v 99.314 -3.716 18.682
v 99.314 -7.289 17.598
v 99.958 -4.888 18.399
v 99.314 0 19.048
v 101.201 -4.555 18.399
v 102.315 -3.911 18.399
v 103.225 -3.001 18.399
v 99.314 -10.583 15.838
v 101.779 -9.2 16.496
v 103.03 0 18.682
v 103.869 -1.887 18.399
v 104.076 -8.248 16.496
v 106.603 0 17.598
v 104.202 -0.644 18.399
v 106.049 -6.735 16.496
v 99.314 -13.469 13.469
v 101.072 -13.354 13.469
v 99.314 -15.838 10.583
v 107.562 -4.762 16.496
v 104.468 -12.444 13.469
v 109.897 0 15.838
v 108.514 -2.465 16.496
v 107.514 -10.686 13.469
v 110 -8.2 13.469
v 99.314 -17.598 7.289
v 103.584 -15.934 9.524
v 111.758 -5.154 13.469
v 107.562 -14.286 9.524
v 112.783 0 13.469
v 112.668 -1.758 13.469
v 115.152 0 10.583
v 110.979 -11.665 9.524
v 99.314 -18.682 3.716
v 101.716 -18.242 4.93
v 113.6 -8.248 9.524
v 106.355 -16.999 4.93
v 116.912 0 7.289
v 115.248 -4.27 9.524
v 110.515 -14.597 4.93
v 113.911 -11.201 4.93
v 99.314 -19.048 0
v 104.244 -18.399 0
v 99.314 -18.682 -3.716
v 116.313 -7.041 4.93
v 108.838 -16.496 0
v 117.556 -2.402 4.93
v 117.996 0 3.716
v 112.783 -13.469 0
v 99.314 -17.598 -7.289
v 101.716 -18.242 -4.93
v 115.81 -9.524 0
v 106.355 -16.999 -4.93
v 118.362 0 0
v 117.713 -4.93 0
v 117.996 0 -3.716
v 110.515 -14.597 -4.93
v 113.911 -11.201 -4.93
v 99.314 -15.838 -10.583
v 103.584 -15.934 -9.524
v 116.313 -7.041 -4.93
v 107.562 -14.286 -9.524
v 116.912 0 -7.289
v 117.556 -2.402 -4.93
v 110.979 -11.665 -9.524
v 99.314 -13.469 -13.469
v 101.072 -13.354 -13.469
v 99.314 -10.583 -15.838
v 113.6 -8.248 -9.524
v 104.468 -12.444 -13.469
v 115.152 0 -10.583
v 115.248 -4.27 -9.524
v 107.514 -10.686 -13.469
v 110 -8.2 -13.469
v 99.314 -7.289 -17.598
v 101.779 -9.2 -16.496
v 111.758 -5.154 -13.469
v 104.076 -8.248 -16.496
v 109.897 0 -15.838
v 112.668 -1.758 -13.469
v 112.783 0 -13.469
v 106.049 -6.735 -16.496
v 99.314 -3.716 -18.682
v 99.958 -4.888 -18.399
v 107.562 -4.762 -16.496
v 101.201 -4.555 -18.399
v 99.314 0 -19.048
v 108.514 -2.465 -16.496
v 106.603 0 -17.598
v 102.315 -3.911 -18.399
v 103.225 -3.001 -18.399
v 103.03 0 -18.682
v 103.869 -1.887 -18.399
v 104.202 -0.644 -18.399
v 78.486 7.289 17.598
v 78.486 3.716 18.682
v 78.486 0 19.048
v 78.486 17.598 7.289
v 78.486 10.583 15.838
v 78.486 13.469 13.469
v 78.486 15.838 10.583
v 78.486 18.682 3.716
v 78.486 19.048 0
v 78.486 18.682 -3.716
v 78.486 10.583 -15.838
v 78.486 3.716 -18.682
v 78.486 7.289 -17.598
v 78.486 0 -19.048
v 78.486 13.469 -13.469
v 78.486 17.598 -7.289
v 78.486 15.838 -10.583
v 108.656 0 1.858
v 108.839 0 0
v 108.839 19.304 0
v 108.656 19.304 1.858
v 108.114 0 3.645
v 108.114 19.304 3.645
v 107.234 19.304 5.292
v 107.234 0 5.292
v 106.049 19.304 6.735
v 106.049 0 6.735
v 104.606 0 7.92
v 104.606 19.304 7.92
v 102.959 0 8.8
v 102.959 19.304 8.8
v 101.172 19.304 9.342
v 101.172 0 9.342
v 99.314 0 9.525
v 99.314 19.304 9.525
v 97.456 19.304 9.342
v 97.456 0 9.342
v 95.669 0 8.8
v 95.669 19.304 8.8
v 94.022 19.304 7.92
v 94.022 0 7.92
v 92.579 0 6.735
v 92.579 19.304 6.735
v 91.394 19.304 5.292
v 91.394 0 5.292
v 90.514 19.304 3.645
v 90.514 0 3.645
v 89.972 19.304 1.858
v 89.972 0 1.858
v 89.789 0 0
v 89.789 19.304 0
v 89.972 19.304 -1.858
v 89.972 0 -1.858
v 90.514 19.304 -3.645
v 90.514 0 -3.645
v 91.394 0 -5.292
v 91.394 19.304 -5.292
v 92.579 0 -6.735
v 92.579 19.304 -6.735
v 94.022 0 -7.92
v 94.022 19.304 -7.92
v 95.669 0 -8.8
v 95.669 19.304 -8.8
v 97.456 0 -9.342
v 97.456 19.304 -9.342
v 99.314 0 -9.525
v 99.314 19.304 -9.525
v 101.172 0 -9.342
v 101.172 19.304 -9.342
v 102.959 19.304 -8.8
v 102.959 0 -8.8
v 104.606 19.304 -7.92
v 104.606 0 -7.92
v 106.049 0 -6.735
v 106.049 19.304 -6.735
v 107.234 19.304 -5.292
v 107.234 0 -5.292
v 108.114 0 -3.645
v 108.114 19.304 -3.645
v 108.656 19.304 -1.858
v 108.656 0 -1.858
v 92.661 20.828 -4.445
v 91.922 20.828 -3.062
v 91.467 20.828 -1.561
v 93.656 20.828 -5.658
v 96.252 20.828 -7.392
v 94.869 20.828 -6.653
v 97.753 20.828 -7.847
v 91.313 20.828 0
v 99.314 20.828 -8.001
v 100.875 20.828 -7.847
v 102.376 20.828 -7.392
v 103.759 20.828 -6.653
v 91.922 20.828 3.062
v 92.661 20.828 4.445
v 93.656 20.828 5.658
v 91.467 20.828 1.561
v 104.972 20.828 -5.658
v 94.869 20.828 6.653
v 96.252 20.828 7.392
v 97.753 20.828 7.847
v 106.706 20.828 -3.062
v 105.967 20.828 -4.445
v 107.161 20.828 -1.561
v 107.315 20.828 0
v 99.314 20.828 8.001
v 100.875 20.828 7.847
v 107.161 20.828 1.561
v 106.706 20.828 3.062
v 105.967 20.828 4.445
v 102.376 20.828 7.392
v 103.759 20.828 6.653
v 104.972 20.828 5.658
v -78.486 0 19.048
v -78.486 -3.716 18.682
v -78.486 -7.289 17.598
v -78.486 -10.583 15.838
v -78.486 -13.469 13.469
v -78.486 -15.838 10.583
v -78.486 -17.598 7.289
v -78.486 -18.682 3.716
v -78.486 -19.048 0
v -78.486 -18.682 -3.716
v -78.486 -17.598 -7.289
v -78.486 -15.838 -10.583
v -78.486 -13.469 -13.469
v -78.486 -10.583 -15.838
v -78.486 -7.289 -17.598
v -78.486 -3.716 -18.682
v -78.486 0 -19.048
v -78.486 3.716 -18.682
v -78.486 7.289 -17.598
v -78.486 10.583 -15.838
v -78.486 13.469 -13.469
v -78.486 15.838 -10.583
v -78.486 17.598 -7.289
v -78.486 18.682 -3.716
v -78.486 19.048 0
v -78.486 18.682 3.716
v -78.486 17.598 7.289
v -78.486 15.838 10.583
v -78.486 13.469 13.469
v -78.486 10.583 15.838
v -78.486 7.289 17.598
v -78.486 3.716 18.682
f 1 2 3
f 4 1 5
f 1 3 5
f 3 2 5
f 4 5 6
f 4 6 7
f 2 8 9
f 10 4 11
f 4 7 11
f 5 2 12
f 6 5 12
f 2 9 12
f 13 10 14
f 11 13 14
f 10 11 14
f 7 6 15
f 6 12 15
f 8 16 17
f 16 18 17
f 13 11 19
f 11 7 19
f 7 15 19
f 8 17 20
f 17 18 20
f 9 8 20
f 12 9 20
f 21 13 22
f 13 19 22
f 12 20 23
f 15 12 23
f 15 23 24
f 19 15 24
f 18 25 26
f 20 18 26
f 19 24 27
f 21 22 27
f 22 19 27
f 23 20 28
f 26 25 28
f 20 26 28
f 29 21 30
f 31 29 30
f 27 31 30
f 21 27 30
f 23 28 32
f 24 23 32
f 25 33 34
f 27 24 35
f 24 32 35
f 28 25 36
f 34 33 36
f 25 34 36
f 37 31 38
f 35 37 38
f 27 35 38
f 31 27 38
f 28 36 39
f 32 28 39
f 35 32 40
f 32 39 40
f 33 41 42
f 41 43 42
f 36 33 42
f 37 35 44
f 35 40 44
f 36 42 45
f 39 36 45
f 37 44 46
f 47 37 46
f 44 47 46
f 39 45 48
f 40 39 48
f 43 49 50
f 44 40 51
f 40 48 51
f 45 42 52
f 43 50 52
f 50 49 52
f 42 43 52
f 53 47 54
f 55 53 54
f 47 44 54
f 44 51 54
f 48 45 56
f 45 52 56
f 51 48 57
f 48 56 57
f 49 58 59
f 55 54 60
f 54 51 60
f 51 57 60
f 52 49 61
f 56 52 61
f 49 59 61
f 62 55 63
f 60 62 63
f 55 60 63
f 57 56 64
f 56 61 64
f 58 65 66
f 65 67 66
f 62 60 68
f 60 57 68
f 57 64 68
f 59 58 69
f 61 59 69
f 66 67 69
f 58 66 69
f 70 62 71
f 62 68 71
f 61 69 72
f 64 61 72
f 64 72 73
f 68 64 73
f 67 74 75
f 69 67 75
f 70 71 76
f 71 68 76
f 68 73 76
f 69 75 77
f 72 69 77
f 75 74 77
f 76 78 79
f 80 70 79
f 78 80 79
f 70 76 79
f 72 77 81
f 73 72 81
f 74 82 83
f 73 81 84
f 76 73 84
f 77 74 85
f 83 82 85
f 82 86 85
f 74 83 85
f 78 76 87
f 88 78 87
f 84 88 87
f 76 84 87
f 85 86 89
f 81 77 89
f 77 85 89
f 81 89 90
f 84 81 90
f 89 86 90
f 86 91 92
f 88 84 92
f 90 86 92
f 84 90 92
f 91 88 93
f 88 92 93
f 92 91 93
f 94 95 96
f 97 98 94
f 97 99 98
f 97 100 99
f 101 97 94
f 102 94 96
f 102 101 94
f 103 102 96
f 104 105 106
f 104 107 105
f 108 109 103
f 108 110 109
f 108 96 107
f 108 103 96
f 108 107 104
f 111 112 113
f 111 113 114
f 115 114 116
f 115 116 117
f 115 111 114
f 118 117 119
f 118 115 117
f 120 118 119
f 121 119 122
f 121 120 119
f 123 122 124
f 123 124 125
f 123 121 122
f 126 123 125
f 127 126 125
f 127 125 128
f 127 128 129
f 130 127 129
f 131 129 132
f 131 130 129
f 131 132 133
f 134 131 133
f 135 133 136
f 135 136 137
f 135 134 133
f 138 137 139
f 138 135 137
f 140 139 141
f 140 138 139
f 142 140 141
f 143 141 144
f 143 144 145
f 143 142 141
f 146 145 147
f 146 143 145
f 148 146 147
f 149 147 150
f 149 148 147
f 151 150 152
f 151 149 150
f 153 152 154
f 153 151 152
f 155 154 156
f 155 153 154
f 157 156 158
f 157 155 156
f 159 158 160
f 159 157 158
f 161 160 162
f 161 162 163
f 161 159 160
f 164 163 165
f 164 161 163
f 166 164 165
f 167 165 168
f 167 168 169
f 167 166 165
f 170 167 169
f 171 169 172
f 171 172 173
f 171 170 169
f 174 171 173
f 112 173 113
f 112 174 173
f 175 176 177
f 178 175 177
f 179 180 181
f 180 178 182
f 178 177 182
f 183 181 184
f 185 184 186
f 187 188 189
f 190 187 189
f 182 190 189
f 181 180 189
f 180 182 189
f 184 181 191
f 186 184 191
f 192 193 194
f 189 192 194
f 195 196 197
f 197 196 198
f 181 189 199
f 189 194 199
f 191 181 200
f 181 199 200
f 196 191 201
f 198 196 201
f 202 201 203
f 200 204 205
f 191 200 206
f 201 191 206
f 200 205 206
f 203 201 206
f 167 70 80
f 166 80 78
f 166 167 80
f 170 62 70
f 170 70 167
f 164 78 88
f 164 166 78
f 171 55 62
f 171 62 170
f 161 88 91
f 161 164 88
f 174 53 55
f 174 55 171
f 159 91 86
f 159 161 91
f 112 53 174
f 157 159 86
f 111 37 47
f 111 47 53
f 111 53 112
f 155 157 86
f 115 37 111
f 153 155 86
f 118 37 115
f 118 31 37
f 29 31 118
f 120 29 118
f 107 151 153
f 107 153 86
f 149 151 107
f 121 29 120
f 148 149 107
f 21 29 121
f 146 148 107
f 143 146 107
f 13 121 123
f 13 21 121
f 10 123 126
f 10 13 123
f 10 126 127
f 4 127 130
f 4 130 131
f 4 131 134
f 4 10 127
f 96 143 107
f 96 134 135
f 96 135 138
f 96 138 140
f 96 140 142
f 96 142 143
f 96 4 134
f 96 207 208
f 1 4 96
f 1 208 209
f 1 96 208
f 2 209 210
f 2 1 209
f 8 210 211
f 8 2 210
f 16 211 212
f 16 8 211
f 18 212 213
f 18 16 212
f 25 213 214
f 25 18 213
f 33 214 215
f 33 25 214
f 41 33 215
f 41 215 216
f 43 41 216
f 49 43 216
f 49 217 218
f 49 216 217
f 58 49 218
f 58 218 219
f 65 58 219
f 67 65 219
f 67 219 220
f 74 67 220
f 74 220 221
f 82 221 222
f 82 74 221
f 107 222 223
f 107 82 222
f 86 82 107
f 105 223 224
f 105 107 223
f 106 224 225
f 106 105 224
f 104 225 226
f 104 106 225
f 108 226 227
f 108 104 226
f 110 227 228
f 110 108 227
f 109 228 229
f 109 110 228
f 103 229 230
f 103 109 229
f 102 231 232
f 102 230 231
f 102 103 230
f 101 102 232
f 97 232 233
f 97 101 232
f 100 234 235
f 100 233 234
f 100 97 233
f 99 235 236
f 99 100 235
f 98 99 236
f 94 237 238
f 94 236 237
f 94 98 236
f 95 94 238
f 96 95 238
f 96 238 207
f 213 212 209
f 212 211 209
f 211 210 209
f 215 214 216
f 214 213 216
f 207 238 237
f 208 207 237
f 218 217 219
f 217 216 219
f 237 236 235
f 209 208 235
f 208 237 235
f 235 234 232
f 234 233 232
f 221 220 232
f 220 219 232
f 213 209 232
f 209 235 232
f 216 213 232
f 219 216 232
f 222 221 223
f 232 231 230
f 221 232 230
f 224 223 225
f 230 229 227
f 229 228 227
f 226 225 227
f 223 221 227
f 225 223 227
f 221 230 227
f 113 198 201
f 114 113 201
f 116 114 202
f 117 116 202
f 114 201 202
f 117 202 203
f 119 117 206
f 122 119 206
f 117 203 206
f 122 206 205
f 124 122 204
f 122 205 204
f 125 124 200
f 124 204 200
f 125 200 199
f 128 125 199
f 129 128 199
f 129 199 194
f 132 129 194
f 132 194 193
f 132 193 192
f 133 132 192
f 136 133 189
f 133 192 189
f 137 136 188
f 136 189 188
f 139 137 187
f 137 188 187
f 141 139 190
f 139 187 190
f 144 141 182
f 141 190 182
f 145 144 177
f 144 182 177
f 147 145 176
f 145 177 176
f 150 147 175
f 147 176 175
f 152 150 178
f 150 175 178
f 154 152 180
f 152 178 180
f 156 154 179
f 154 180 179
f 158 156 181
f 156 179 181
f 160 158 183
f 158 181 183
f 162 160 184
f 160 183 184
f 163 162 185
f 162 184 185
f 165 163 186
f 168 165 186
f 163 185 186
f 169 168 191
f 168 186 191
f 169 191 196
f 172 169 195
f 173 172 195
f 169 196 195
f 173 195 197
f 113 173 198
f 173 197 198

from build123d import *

# Parameters (mm, degrees)
F0_W     = 156.972
F0_H     = 19.0483668515
F1_W     = 20.828
F1_H     = 19.0483668515
F3_ANGLE = 180
F4_ANGLE = 90
F5_R     = 9.525
F6_DEPTH = 20.828
F7_SIZE2 = 1.524
F7_SIZE  = 1.524


with BuildPart() as f2:
    # F0 (on Front) → F2 (revolve)
    with BuildSketch(Plane.XZ):
        with Locations((0, 9.5241834258)):
            Rectangle(F0_W, F0_H)
    revolve(axis=Axis((0, 0, 0), (-1, 0, 0)))

    # F1 (on Front) → F3 (revolve)
    with BuildSketch(Plane.XZ):
        with Locations((88.9, 9.5241834258)):
            Rectangle(F1_W, F1_H)
    revolve(axis=Axis((88.9, 0, 0), (1, 0, 0)), revolution_arc=F3_ANGLE)

    # F3_face (on face) → F4 (revolve)
    with BuildSketch(Plane(origin=(99.314, -8.0843779793, 0), x_dir=(0, 1, 0), z_dir=(1, 0, 0))):
        with BuildLine():
            ThreePointArc((8.0843779793, 19.0483668515), (-10.9639888722, 0), (8.0843779793, -19.0483668515))
            Line((8.0843779793, -19.0483668515), (8.0843779793, 19.0483668515))
        make_face()
    revolve(axis=Axis((99.314, 0, 0), (0, 0, 1)), revolution_arc=F4_ANGLE)

    # F5 (on Front) → F6 (join)
    with BuildSketch(Plane.XZ):
        with Locations((99.314, 0)):
            Circle(F5_R)
    extrude(amount=-F6_DEPTH)

    # F7
    f7_edges = [f2.edges().sort_by_distance(p)[0] for p in [
        (89.789, 20.828, 0),
    ]]
    chamfer(f7_edges, length=F7_SIZE, length2=F7_SIZE2)


solid = f2.part
